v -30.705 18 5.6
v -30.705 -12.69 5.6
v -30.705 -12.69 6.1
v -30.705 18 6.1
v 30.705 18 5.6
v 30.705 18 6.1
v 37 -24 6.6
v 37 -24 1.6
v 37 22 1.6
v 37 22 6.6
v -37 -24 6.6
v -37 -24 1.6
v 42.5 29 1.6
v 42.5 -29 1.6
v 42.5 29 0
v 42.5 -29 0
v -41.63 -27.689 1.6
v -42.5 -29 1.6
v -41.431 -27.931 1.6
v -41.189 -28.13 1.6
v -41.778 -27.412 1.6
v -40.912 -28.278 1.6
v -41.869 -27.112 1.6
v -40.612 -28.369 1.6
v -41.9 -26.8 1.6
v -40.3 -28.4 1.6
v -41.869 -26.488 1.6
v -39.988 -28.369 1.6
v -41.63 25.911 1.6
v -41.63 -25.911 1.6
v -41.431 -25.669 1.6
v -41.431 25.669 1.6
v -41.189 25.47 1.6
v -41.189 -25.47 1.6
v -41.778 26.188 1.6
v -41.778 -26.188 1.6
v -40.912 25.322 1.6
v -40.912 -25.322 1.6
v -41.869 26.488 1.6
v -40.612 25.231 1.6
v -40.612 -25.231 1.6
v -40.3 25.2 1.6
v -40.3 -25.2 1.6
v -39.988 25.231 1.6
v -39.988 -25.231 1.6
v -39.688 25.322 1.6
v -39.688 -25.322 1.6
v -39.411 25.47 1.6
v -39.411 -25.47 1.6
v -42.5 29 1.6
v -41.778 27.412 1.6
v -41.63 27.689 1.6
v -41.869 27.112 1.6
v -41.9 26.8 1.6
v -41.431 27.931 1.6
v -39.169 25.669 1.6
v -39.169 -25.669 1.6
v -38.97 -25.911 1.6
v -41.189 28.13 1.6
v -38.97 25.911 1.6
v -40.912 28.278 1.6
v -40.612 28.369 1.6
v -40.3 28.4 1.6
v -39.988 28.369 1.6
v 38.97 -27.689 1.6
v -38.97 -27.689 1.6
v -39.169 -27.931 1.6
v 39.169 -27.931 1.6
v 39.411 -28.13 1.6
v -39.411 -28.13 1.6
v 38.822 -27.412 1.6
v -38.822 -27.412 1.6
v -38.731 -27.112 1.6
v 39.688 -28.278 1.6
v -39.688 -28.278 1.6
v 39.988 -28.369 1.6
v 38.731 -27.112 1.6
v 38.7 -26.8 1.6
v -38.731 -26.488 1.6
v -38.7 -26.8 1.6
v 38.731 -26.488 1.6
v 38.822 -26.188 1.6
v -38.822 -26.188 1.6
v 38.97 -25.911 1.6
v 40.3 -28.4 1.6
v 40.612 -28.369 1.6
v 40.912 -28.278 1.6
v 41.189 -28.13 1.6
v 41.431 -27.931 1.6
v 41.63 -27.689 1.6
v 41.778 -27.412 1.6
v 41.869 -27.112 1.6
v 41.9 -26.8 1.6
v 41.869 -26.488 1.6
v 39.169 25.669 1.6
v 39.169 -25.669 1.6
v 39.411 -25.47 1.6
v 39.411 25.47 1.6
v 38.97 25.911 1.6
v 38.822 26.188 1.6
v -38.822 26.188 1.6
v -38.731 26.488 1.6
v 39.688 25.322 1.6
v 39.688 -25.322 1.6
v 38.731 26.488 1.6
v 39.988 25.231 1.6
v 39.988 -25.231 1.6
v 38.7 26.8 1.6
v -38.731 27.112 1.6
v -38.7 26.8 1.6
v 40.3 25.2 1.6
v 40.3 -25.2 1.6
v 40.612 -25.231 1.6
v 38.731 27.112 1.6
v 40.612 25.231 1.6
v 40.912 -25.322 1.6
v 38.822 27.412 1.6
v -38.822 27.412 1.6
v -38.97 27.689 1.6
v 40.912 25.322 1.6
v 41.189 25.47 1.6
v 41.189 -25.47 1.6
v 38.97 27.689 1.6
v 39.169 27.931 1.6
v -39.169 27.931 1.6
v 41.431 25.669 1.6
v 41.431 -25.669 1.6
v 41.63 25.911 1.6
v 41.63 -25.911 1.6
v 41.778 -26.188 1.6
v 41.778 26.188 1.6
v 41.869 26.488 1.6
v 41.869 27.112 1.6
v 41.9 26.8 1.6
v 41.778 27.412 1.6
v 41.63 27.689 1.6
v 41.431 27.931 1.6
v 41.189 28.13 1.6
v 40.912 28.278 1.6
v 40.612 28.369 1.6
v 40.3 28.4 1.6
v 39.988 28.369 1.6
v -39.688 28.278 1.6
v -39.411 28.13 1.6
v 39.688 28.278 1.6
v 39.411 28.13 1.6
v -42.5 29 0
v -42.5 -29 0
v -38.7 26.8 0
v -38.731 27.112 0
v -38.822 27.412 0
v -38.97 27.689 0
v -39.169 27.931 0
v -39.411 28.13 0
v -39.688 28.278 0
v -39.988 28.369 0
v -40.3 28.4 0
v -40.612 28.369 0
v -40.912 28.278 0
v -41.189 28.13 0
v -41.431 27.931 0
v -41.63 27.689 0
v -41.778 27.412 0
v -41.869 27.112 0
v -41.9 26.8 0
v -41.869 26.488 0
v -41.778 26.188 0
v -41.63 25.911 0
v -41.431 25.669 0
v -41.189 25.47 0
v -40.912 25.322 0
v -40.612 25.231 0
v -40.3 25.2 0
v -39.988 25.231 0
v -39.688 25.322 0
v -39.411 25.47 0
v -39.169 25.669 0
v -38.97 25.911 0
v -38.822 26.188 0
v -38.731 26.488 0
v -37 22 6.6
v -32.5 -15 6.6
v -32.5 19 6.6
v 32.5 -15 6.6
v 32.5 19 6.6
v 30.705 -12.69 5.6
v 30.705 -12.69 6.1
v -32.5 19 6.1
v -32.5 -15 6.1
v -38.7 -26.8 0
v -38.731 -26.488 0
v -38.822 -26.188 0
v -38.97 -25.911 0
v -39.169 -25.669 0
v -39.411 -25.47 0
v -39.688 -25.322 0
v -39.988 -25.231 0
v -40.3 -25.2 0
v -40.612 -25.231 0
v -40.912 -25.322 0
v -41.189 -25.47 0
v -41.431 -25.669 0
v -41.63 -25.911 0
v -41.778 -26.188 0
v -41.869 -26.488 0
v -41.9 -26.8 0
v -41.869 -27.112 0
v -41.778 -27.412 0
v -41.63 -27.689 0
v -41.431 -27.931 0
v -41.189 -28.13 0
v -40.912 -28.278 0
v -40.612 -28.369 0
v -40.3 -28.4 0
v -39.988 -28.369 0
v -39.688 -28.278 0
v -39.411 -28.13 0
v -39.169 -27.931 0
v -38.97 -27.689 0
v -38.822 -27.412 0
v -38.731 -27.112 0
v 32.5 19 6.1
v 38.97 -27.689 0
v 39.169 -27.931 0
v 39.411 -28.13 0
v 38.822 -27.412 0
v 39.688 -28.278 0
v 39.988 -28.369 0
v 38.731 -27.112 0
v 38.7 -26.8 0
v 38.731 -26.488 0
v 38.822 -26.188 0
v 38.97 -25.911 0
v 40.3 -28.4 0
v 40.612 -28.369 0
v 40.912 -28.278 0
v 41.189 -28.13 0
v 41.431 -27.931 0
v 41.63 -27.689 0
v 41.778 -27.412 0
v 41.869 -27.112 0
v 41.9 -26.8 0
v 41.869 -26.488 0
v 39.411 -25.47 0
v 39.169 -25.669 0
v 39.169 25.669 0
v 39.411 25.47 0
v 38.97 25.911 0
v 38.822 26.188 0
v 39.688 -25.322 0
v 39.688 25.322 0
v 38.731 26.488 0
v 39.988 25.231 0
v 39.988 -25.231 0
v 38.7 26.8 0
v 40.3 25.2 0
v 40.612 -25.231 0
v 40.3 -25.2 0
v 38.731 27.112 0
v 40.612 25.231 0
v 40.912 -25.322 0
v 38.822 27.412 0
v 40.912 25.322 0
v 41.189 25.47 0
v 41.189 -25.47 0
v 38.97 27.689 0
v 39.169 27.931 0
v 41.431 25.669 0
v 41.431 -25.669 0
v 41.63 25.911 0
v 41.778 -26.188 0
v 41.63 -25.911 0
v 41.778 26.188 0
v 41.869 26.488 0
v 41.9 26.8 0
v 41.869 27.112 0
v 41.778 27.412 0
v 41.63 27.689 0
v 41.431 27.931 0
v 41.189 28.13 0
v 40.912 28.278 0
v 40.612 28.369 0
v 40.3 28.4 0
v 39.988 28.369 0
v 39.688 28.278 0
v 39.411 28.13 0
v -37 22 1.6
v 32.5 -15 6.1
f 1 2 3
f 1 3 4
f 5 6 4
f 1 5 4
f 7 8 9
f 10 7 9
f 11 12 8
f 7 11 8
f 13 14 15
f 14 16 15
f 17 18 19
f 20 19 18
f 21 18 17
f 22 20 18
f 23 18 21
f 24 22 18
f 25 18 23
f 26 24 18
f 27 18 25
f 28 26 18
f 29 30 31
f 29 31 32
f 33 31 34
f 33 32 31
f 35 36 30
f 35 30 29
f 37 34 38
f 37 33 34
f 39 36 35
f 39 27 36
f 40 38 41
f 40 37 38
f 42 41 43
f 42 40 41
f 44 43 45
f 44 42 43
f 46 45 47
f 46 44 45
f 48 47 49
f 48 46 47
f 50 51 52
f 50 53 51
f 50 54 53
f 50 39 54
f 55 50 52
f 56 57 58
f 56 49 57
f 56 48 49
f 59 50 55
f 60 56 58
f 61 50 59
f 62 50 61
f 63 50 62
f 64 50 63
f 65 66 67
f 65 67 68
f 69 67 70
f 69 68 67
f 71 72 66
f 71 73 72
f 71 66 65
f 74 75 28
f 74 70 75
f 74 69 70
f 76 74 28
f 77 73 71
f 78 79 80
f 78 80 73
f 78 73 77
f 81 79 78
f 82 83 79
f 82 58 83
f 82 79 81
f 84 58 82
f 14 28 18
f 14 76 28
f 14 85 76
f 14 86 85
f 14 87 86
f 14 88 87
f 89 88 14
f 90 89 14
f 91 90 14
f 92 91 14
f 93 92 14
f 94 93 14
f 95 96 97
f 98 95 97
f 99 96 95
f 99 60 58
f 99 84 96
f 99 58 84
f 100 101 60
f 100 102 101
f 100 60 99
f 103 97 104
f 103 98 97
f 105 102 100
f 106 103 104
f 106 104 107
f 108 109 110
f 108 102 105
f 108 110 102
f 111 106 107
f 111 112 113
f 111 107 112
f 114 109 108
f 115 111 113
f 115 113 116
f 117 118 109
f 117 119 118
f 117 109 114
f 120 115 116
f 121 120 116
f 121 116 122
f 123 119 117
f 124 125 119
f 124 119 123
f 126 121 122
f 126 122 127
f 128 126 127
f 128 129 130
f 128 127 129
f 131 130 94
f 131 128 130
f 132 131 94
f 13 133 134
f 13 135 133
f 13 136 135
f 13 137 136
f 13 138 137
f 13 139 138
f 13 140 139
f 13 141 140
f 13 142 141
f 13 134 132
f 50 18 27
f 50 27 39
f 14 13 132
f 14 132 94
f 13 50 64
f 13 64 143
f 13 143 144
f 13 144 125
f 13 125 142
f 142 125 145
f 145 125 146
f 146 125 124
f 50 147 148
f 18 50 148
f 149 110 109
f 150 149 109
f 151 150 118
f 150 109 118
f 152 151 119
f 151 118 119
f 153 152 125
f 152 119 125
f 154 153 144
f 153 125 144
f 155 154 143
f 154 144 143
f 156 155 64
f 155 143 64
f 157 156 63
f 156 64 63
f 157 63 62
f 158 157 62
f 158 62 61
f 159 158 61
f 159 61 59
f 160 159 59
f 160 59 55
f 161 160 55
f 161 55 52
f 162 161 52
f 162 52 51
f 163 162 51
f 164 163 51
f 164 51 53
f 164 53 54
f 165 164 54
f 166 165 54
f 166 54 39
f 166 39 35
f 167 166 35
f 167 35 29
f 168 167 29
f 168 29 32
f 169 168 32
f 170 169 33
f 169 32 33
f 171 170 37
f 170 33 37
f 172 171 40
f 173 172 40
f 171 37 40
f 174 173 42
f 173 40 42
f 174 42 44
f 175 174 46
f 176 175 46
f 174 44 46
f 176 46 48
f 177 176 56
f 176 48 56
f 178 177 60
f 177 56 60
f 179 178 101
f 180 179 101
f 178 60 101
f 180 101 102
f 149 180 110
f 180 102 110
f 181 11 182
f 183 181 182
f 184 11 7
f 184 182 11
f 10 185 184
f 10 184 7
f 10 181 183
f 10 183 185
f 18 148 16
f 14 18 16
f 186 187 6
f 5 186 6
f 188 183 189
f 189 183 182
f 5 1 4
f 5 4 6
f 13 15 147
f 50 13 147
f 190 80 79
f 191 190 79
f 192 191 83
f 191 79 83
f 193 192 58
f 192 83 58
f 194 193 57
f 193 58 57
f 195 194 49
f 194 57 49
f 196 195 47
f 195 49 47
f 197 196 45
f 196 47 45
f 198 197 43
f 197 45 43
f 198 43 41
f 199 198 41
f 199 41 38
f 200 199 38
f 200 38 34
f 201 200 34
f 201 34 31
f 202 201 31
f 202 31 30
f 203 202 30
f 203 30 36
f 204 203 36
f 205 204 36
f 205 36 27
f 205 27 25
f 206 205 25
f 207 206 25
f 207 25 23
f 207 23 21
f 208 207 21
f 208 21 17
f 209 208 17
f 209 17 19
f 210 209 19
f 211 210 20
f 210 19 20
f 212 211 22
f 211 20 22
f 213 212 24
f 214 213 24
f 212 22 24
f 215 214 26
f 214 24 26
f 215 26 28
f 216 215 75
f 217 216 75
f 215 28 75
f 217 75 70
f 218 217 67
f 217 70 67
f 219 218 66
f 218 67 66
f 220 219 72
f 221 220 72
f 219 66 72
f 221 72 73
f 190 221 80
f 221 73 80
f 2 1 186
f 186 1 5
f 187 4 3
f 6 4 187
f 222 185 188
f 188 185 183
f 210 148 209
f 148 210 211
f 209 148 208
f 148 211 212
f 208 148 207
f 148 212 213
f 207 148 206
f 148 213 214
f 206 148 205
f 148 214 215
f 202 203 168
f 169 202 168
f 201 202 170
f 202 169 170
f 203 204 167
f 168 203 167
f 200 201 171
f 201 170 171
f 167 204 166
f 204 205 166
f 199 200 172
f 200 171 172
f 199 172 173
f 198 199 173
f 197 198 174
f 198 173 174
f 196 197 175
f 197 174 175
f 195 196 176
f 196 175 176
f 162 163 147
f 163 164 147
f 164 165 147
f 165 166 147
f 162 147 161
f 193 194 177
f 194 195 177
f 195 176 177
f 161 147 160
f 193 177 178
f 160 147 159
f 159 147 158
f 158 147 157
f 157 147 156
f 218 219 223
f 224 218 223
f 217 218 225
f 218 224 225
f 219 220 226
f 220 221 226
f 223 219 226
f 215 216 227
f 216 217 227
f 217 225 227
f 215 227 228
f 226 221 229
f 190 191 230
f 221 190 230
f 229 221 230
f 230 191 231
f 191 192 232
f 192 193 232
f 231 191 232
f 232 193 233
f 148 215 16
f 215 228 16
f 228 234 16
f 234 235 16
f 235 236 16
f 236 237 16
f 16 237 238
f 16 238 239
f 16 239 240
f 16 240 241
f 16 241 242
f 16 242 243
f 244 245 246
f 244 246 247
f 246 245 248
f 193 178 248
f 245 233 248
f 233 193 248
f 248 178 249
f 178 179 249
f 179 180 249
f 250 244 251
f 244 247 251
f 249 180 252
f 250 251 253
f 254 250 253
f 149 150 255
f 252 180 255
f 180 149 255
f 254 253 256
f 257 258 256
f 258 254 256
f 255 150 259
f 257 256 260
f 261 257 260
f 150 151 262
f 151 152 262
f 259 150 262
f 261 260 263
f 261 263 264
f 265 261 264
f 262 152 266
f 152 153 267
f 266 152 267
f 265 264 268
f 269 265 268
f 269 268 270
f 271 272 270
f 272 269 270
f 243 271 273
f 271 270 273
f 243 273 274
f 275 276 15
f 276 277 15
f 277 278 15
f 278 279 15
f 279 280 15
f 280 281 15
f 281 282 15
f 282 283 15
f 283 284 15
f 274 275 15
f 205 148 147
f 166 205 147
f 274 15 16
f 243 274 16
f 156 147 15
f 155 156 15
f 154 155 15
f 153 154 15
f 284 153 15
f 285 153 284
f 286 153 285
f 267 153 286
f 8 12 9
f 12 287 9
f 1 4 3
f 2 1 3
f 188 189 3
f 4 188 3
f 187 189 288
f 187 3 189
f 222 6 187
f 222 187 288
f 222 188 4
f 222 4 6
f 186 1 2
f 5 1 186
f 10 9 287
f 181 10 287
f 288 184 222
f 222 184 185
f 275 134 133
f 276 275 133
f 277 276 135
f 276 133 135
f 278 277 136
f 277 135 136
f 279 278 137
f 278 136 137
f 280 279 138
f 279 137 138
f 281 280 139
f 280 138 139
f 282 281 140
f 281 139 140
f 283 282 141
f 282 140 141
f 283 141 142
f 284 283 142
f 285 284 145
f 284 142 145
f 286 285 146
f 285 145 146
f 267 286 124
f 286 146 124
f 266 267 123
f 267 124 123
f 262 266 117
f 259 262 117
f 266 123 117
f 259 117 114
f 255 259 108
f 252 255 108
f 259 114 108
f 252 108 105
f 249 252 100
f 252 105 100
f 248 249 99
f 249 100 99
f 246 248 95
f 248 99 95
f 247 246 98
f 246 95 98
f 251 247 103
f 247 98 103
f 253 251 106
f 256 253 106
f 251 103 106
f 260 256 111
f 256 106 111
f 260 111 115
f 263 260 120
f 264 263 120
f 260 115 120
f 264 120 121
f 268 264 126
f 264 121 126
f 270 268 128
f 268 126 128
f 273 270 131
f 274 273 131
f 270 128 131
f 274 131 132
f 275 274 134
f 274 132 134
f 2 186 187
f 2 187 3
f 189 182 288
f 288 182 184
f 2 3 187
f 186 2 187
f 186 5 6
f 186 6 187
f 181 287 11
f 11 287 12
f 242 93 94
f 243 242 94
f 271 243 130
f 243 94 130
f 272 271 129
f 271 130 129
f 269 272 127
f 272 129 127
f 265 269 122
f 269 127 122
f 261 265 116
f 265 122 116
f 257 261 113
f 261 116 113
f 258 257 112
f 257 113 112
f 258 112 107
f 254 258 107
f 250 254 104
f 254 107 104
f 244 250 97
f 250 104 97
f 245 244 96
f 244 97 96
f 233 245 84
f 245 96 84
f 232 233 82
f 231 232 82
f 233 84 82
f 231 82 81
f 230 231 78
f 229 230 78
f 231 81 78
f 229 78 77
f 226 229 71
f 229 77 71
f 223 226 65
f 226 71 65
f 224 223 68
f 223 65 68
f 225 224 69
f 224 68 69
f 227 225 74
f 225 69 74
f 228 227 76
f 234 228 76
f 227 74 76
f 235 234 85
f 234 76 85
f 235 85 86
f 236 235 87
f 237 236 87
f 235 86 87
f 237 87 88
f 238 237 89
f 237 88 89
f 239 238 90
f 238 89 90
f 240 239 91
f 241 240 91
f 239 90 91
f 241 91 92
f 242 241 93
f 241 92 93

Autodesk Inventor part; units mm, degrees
ref_plane "YZ Plane" through (0, 0, 0) normal (1, 0, 0) x (0, 1, 0)
ref_plane "XZ Plane" through (0, 0, 0) normal (0, 1, 0) x (-1, 0, 0)
ref_plane "XY Plane" through (0, 0, 0) normal (0, 0, 1) x (1, 0, 0)
sketch "Sketch1" plane through (0, 0, 0) normal (0, 0, 1) x (1, 0, 0)
  line L0 (-42.5, -29) -> (42.5, -29)
  line L1 (42.5, -29) -> (42.5, 29)
  line L2 (42.5, 29) -> (-42.5, 29)
  line L3 (-42.5, 29) -> (-42.5, -29)
  line L4 (-42.5, -29) -> (42.5, 29) construction
  line L5 (42.5, -29) -> (-42.5, 29) construction
  point P0 (0, 0)
  dimension "d0" = 85
  dimension "d1" = 58
extrude "Extrusion1" add sketch "Sketch1" along normal blind 1.6
sketch "Sketch2" plane through (0, 0, 1.6) normal (0, 0, 1) x (1, 0, 0)
  line L0 (-59.5, 0) -> (59.5, 0) construction
  line L1 (0, -40.6) -> (0, 40.6) construction
  circle A0 centre (-40.3, 26.8) radius 1.6
  line L2 (42.5, 29) -> (-42.5, 29) construction
  line L3 (-42.5, 29) -> (-42.5, -29) construction
  circle A1 centre (40.3, 26.8) radius 1.6
  circle A2 centre (-40.3, -26.8) radius 1.6
  line L4 (42.5, -29) -> (-42.5, -29) construction
  circle A3 centre (40.3, -26.8) radius 1.6
  point P0 (0, 0)
  dimension "d4" = 3.2
  dimension "d5" = 0.6
  dimension "d6" = 0.6
extrude "Extrusion2" cut sketch "Sketch2" against normal through all
sketch "Sketch3" plane through (0, 0, 1.6) normal (0, 0, 1) x (1, 0, 0)
  line L0 (0, 40.6) -> (0, -40.6) projected
  line L1 (-37, -24) -> (37, -24)
  line L2 (37, -24) -> (37, 22)
  line L3 (37, 22) -> (-37, 22)
  line L4 (-37, 22) -> (-37, -24)
  line L5 (-37, -24) -> (37, 22) construction
  line L6 (37, -24) -> (-37, 22) construction
  line L7 (-59.5, 0) -> (59.5, 0) projected
  point P0 (0, -1)
  dimension "d9" = 46
  dimension "d10" = 74
  dimension "d25" = 1
extrude "Extrusion3" add sketch "Sketch3" along normal blind 5 separate body
sketch "Sketch4" plane through (0, 0, 6.6) normal (0, 0, 1) x (1, 0, 0)
  line L0 (0, -40.6) -> (0, 40.6) projected
  line L1 (-32.5, -15) -> (32.5, -15)
  line L2 (32.5, -15) -> (32.5, 19)
  line L3 (32.5, 19) -> (-32.5, 19)
  line L4 (-32.5, 19) -> (-32.5, -15)
  line L5 (-32.5, -15) -> (32.5, 19) construction
  line L6 (32.5, -15) -> (-32.5, 19) construction
  line L7 (37, 22) -> (-37, 22) projected
  point P0 (0, 0)
  point P1 (0, 2)
  dimension "d13" = 34
  dimension "d14" = 65
  dimension "d15" = 3
extrude "Extrusion4" cut sketch "Sketch4" against normal blind 0.5 bodies 2
sketch "Sketch5" plane through (0, 0, 6.1) normal (0, 0, 1) x (1, 0, 0)
  line L0 (0, 40.6) -> (0, -40.6) projected
  line L1 (-30.705, -12.69) -> (30.705, -12.69)
  line L2 (30.705, -12.69) -> (30.705, 18)
  line L3 (30.705, 18) -> (-30.705, 18)
  line L4 (-30.705, 18) -> (-30.705, -12.69)
  line L5 (-30.705, -12.69) -> (30.705, 18) construction
  line L6 (30.705, -12.69) -> (-30.705, 18) construction
  line L7 (37, 22) -> (-37, 22) projected
  point P0 (0, 0)
  point P1 (0, 2.655)
  dimension "d18" = 30.69
  dimension "d19" = 61.41
  dimension "d20" = 4
extrude "Extrusion5" cut sketch "Sketch5" against normal blind 0.5 bodies 2
sketch "Sketch6" plane through (0, 0, 5.6) normal (0, 0, 1) x (1, 0, 0)
  line L0 (30.705, -12.69) -> (-30.705, -12.69) projected
  line L1 (30.705, 18) -> (30.705, -12.69) projected
  line L2 (-30.705, 18) -> (30.705, 18) projected
  line L3 (-30.705, -12.69) -> (-30.705, 18) projected
  point P0 (0, 0)
extrude "Extrusion6" add sketch "Sketch6" along normal blind 0.5 separate body
sketch "Sketch7" plane through (0, 0, 6.6) normal (0, 0, 1) x (1, 0, 0)
  circle A0 centre (0, 0) radius 6.7082
equation "\"d6\" = d5"
properties part number "Adafruit_2675"
